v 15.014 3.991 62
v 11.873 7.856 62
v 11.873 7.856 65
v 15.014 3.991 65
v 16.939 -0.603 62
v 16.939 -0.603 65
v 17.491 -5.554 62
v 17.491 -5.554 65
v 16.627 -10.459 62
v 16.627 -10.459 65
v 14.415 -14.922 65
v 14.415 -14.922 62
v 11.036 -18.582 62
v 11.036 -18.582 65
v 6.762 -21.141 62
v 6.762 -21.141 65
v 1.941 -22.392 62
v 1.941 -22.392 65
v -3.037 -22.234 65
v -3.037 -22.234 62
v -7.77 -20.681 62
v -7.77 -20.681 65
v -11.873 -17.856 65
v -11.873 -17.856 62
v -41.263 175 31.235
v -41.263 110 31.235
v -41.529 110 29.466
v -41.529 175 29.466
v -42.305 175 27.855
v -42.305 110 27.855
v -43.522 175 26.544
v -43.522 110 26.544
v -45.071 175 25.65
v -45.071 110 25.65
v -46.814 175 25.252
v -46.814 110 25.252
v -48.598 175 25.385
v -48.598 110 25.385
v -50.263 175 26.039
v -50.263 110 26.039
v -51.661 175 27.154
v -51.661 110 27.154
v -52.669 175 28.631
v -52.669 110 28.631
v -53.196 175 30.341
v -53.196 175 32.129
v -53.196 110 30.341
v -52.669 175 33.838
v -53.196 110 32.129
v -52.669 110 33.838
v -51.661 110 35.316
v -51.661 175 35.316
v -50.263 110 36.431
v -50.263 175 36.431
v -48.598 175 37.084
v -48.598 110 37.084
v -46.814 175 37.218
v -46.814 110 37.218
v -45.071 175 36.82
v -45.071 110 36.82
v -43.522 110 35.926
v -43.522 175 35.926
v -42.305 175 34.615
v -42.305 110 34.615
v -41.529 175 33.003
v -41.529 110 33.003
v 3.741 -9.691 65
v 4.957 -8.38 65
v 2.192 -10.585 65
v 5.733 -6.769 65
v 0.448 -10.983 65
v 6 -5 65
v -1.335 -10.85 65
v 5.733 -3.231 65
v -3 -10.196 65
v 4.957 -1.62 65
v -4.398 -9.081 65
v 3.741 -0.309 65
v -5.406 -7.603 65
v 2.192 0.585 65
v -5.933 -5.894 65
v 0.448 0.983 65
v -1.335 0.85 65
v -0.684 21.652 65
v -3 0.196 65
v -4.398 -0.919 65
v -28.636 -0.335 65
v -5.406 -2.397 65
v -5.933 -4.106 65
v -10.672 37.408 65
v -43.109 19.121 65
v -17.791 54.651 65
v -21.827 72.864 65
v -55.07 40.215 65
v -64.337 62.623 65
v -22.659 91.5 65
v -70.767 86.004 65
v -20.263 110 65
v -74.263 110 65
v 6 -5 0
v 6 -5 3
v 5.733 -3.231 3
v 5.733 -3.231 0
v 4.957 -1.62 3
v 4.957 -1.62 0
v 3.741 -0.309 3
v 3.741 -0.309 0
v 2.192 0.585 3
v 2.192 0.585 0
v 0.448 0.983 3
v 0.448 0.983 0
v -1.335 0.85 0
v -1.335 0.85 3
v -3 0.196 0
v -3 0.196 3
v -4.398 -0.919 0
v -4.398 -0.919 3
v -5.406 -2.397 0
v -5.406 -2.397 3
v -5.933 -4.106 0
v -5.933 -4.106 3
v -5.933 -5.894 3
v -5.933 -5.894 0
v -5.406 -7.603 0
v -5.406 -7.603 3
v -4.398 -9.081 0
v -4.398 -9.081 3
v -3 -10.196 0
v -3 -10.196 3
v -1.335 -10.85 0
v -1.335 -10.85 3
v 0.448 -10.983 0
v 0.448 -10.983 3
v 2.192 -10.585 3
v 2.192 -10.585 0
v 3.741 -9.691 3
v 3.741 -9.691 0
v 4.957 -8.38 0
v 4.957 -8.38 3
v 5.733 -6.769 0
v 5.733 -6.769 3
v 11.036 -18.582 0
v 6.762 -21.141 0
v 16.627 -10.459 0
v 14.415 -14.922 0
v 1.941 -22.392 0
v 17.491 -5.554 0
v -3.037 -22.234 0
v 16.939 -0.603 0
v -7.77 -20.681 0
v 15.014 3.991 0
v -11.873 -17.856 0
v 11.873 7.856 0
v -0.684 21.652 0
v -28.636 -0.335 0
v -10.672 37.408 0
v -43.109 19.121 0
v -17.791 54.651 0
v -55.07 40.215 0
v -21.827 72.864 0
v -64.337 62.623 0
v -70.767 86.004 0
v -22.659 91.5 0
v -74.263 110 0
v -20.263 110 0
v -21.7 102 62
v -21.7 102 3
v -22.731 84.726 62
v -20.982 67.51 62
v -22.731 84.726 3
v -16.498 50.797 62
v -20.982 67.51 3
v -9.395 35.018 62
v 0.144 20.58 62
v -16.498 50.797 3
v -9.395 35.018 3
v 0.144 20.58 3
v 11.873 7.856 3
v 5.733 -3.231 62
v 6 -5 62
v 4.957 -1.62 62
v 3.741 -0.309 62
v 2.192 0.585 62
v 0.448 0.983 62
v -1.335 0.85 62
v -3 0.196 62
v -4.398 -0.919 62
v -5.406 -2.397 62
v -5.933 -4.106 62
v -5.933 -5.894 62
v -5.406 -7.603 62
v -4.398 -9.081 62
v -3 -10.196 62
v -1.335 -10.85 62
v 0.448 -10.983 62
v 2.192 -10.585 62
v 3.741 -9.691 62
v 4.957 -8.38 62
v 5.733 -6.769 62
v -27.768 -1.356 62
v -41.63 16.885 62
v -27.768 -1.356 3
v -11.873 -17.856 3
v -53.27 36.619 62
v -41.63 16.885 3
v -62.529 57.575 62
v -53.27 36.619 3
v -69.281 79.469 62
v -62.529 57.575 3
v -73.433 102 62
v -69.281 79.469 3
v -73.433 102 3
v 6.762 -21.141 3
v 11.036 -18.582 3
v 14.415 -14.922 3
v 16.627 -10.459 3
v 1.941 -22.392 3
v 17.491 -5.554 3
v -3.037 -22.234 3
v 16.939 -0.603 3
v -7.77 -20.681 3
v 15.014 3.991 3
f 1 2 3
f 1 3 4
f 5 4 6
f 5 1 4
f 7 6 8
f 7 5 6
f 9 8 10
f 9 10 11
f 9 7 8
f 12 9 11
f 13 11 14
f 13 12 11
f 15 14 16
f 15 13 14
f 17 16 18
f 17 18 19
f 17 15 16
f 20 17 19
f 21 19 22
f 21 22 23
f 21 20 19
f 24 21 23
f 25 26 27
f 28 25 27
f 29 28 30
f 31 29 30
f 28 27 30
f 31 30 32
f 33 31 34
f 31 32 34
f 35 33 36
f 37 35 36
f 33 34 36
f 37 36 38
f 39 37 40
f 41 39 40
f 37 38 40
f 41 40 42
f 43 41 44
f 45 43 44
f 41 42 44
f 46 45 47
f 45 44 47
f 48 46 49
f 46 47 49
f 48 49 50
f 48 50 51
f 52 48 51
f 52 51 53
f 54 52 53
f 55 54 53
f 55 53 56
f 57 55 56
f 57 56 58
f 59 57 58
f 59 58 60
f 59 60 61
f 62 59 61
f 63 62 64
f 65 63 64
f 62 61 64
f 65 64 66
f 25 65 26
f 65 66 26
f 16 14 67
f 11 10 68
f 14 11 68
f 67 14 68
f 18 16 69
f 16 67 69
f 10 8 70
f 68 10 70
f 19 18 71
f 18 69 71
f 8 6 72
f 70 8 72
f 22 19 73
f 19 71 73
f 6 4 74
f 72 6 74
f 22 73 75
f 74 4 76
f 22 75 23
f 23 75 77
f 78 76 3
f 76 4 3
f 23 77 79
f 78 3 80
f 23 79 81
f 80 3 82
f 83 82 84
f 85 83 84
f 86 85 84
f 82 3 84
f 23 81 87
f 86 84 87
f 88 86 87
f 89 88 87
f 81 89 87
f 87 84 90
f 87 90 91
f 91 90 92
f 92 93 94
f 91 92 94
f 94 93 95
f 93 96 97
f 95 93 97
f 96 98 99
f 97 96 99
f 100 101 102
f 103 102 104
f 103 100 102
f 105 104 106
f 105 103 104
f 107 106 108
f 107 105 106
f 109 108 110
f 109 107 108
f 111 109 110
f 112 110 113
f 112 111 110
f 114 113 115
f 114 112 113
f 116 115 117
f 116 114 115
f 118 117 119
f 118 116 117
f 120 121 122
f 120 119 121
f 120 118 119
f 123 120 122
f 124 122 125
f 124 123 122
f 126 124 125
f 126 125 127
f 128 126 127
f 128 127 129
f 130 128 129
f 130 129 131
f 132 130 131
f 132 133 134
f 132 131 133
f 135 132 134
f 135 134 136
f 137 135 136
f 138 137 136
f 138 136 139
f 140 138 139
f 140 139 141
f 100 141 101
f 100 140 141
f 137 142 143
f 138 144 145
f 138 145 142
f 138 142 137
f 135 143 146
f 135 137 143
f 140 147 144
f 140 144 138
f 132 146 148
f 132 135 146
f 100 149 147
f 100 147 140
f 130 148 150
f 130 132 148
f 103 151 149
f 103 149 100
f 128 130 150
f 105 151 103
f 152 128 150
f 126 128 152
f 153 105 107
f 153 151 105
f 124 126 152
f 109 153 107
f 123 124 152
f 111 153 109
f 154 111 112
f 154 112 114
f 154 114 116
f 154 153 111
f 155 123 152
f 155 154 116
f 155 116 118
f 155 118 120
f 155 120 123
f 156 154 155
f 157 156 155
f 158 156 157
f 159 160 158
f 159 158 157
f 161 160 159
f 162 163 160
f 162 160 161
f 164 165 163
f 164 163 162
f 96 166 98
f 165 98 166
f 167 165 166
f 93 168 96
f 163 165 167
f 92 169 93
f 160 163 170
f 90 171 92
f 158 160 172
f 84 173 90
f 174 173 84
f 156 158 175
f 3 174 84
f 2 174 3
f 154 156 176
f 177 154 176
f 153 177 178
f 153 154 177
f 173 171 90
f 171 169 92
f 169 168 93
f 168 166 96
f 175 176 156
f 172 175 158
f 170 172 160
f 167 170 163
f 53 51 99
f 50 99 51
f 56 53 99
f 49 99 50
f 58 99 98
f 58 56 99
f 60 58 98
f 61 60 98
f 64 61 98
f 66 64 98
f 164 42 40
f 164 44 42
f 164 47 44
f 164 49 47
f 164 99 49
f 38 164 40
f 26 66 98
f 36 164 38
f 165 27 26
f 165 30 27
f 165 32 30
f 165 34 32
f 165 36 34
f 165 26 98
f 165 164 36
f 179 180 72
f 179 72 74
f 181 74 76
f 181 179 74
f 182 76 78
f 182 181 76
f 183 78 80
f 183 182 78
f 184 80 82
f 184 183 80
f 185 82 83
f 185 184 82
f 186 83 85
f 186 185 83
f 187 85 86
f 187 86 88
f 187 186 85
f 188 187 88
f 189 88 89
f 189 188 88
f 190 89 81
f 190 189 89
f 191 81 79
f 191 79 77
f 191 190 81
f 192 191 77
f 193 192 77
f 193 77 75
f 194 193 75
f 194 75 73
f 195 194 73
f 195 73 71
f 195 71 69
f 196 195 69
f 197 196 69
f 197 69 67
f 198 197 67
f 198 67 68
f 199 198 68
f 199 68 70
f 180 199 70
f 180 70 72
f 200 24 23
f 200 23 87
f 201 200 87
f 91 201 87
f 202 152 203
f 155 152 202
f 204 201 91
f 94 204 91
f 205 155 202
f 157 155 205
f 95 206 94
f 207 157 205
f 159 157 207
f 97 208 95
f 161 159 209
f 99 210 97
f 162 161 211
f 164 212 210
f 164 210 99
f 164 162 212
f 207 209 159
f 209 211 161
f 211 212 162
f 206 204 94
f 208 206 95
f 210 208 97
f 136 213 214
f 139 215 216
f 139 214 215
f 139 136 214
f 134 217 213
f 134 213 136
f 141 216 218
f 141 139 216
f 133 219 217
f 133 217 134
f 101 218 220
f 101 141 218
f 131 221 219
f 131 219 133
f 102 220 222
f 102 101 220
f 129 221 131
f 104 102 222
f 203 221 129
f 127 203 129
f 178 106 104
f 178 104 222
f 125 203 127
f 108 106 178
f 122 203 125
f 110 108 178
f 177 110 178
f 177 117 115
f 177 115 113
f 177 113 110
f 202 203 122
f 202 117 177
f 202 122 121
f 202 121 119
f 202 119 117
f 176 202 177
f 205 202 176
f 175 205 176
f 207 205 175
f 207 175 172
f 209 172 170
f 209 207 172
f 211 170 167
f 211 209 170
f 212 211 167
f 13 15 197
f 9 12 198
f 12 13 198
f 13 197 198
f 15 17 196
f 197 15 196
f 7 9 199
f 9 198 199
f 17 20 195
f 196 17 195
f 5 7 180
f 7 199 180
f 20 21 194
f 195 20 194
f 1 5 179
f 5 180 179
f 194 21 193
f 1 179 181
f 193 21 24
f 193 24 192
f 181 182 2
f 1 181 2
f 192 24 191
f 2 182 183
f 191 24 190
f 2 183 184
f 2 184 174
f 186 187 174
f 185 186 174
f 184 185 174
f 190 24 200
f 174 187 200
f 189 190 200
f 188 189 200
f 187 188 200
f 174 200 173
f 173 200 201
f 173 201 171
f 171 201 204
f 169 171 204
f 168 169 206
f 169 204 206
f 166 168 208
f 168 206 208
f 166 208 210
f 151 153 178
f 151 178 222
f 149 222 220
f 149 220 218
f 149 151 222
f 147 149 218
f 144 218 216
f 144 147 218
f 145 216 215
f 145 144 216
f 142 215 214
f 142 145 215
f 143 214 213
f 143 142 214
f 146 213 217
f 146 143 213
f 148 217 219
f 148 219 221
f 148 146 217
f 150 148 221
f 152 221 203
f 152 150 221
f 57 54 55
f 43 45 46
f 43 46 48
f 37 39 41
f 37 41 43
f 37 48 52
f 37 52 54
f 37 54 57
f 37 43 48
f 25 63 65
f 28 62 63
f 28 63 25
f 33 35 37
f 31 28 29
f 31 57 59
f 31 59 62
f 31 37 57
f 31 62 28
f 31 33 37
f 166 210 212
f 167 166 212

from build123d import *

# Parameters (mm, degrees)
CROQUIS1_R                 = 6
SALIENTE_EXTRUIR1_DEPTH    = 65
CORTAR_EXTRUIR1_DEPTH      = 148.783471464
CORTAR_EXTRUIR1_DEPTH_BACK = 148.783471464
CROQUIS2_W                 = 59
CROQUIS2_H                 = 249
CROQUIS3_R                 = 6
SALIENTE_EXTRUIR2_DEPTH    = 65


with BuildPart() as part:
    # Croquis1 → Saliente-Extruir1 (new body)
    with BuildSketch(Plane.XY):
        with BuildLine():
            Line((-74.262739229, 110), (-20.262739229, 110))
            ThreePointArc((-20.262739229, 110), (-17.790684157, 54.650853089), (11.872762465, 7.856419076))
            ThreePointArc((11.872762465, 7.856419076), (12.856419076, -16.872762465), (-11.872762465, -17.856419076))
            ThreePointArc((-11.872762465, -17.856419076), (-55.070234136, 40.214949961), (-74.262739229, 110))
        make_face()
        with Locations((0, -5)):
            Circle(CROQUIS1_R, mode=Mode.SUBTRACT)
    extrude(amount=SALIENTE_EXTRUIR1_DEPTH)

    # Croquis2 → Cortar-Extruir1 (cut, two sides: drawn at the far end of the back side and taken through both)
    with BuildSketch(Plane(origin=(0, 0, 0), x_dir=(0, 0, -1), z_dir=(1, 0, 0)).offset(-CORTAR_EXTRUIR1_DEPTH_BACK)):
        with Locations((-32.5, -22.5)):
            Rectangle(CROQUIS2_W, CROQUIS2_H)
    extrude(amount=CORTAR_EXTRUIR1_DEPTH + CORTAR_EXTRUIR1_DEPTH_BACK, mode=Mode.SUBTRACT)

    # Croquis3 → Saliente-Extruir2 (add)
    with BuildSketch(Plane(origin=(0, 110, 0), x_dir=(1, 0, 0), z_dir=(0, 1, 0))):
        with Locations((-47.262739229, -31.234778604)):
            Circle(CROQUIS3_R)
    extrude(amount=SALIENTE_EXTRUIR2_DEPTH)


solid = part.part
